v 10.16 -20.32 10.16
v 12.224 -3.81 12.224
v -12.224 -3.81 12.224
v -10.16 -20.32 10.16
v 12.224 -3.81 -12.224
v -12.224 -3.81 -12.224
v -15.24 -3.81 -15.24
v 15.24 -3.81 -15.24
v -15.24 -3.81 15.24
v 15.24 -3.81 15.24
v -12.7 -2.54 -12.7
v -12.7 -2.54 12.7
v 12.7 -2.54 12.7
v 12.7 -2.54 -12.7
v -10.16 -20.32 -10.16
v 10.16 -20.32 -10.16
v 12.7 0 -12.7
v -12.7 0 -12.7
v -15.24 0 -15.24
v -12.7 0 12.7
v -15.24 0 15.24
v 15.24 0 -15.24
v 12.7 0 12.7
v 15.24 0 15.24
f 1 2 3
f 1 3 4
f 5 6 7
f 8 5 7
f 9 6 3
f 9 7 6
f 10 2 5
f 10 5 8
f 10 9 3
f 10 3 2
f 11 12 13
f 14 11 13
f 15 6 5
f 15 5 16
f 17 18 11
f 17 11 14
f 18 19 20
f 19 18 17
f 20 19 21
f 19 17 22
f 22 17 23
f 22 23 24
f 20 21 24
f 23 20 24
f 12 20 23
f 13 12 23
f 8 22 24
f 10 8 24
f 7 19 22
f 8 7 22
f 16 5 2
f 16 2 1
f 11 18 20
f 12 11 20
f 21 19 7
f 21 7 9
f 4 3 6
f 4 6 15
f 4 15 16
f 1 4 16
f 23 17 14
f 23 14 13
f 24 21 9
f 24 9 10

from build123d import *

# Parameters (mm, degrees)
F0_W         = 30.48
F0_H         = 30.48
F0_W_2       = 25.4
F0_H_2       = 25.4
F1_DEPTH     = 3.81
F0_W_3       = 15.24
F0_H_3       = 15.24
F2_DEPTH     = 20.32
F3_DEPTH     = 2.54
F4_T4_DEPTH  = 131.0338200082
F4_T9_DEPTH  = 131.0338200082
F4_T14_DEPTH = 131.0338200082
F4_T19_DEPTH = 131.0338200082


# Not quite as in the source:
# - a fillet or chamfer that OpenCascade refuses, or shapes differently, is made with other operations: its cross-section is extruded or revolved along the edge and cut away or added


with BuildPart() as f1:
    # F0 (on Front) → F1 (new body)
    with BuildSketch(Plane.XZ):
        Rectangle(F0_W, F0_H)
        Rectangle(F0_W_2, F0_H_2, mode=Mode.SUBTRACT)
    extrude(amount=F1_DEPTH)

    # F0 (on Front) → F2 (join)
    with BuildSketch(Plane.XZ):
        Rectangle(F0_W_2, F0_H_2)
        Rectangle(F0_W_3, F0_H_3, mode=Mode.SUBTRACT)
        Rectangle(F0_W_3, F0_H_3)
    extrude(amount=F2_DEPTH)

    # F0 (on Front) → F3 (cut)
    with BuildSketch(Plane.XZ):
        Rectangle(F0_W_2, F0_H_2)
        Rectangle(F0_W_3, F0_H_3, mode=Mode.SUBTRACT)
        Rectangle(F0_W_3, F0_H_3)
    extrude(amount=F3_DEPTH, mode=Mode.SUBTRACT)

    # F4: chamfer of 2.54 x 20.32 on 4 edges, made by hand


with BuildPart() as f4_tool2:
    # F4_s3 → F4_t4 (new body)
    with BuildSketch(Plane.YZ.offset(65.5169100041)):
        Polygon((0, 12.7), (-20.32, 10.16), (-20.32, 12.7), align=None)
    extrude(amount=-F4_T4_DEPTH)

    split(bisect_by=Plane.XZ.offset(3.81), keep=Keep.TOP)


with BuildPart() as f1_1:
    add(f1.part)

    # F4_t1: cut F4_tool2
    add(f4_tool2.part, mode=Mode.SUBTRACT)


with BuildPart() as f4_tool7:
    # F4_s8 → F4_t9 (new body)
    with BuildSketch(Plane.XY.offset(65.5169100041)):
        Polygon((-12.7, 0), (-10.16, -20.32), (-12.7, -20.32), align=None)
    extrude(amount=-F4_T9_DEPTH)

    split(bisect_by=Plane.XZ.offset(3.81), keep=Keep.TOP)


with BuildPart() as f1_2:
    add(f1_1.part)

    # F4_t6: cut F4_tool7
    add(f4_tool7.part, mode=Mode.SUBTRACT)


with BuildPart() as f4_tool12:
    # F4_s13 → F4_t14 (new body)
    with BuildSketch(Plane.YZ.offset(-65.5169100041)):
        Polygon((0, -12.7), (-20.32, -10.16), (-20.32, -12.7), align=None)
    extrude(amount=F4_T14_DEPTH)

    split(bisect_by=Plane.XZ.offset(3.81), keep=Keep.TOP)


with BuildPart() as f1_3:
    add(f1_2.part)

    # F4_t11: cut F4_tool12
    add(f4_tool12.part, mode=Mode.SUBTRACT)


with BuildPart() as f4_tool17:
    # F4_s18 → F4_t19 (new body)
    with BuildSketch(Plane.XY.offset(-65.5169100041)):
        Polygon((12.7, 0), (10.16, -20.32), (12.7, -20.32), align=None)
    extrude(amount=F4_T19_DEPTH)

    split(bisect_by=Plane.XZ.offset(3.81), keep=Keep.TOP)


with BuildPart() as f1_4:
    add(f1_3.part)

    # F4_t16: cut F4_tool17
    add(f4_tool17.part, mode=Mode.SUBTRACT)


solid = f1_4.part
